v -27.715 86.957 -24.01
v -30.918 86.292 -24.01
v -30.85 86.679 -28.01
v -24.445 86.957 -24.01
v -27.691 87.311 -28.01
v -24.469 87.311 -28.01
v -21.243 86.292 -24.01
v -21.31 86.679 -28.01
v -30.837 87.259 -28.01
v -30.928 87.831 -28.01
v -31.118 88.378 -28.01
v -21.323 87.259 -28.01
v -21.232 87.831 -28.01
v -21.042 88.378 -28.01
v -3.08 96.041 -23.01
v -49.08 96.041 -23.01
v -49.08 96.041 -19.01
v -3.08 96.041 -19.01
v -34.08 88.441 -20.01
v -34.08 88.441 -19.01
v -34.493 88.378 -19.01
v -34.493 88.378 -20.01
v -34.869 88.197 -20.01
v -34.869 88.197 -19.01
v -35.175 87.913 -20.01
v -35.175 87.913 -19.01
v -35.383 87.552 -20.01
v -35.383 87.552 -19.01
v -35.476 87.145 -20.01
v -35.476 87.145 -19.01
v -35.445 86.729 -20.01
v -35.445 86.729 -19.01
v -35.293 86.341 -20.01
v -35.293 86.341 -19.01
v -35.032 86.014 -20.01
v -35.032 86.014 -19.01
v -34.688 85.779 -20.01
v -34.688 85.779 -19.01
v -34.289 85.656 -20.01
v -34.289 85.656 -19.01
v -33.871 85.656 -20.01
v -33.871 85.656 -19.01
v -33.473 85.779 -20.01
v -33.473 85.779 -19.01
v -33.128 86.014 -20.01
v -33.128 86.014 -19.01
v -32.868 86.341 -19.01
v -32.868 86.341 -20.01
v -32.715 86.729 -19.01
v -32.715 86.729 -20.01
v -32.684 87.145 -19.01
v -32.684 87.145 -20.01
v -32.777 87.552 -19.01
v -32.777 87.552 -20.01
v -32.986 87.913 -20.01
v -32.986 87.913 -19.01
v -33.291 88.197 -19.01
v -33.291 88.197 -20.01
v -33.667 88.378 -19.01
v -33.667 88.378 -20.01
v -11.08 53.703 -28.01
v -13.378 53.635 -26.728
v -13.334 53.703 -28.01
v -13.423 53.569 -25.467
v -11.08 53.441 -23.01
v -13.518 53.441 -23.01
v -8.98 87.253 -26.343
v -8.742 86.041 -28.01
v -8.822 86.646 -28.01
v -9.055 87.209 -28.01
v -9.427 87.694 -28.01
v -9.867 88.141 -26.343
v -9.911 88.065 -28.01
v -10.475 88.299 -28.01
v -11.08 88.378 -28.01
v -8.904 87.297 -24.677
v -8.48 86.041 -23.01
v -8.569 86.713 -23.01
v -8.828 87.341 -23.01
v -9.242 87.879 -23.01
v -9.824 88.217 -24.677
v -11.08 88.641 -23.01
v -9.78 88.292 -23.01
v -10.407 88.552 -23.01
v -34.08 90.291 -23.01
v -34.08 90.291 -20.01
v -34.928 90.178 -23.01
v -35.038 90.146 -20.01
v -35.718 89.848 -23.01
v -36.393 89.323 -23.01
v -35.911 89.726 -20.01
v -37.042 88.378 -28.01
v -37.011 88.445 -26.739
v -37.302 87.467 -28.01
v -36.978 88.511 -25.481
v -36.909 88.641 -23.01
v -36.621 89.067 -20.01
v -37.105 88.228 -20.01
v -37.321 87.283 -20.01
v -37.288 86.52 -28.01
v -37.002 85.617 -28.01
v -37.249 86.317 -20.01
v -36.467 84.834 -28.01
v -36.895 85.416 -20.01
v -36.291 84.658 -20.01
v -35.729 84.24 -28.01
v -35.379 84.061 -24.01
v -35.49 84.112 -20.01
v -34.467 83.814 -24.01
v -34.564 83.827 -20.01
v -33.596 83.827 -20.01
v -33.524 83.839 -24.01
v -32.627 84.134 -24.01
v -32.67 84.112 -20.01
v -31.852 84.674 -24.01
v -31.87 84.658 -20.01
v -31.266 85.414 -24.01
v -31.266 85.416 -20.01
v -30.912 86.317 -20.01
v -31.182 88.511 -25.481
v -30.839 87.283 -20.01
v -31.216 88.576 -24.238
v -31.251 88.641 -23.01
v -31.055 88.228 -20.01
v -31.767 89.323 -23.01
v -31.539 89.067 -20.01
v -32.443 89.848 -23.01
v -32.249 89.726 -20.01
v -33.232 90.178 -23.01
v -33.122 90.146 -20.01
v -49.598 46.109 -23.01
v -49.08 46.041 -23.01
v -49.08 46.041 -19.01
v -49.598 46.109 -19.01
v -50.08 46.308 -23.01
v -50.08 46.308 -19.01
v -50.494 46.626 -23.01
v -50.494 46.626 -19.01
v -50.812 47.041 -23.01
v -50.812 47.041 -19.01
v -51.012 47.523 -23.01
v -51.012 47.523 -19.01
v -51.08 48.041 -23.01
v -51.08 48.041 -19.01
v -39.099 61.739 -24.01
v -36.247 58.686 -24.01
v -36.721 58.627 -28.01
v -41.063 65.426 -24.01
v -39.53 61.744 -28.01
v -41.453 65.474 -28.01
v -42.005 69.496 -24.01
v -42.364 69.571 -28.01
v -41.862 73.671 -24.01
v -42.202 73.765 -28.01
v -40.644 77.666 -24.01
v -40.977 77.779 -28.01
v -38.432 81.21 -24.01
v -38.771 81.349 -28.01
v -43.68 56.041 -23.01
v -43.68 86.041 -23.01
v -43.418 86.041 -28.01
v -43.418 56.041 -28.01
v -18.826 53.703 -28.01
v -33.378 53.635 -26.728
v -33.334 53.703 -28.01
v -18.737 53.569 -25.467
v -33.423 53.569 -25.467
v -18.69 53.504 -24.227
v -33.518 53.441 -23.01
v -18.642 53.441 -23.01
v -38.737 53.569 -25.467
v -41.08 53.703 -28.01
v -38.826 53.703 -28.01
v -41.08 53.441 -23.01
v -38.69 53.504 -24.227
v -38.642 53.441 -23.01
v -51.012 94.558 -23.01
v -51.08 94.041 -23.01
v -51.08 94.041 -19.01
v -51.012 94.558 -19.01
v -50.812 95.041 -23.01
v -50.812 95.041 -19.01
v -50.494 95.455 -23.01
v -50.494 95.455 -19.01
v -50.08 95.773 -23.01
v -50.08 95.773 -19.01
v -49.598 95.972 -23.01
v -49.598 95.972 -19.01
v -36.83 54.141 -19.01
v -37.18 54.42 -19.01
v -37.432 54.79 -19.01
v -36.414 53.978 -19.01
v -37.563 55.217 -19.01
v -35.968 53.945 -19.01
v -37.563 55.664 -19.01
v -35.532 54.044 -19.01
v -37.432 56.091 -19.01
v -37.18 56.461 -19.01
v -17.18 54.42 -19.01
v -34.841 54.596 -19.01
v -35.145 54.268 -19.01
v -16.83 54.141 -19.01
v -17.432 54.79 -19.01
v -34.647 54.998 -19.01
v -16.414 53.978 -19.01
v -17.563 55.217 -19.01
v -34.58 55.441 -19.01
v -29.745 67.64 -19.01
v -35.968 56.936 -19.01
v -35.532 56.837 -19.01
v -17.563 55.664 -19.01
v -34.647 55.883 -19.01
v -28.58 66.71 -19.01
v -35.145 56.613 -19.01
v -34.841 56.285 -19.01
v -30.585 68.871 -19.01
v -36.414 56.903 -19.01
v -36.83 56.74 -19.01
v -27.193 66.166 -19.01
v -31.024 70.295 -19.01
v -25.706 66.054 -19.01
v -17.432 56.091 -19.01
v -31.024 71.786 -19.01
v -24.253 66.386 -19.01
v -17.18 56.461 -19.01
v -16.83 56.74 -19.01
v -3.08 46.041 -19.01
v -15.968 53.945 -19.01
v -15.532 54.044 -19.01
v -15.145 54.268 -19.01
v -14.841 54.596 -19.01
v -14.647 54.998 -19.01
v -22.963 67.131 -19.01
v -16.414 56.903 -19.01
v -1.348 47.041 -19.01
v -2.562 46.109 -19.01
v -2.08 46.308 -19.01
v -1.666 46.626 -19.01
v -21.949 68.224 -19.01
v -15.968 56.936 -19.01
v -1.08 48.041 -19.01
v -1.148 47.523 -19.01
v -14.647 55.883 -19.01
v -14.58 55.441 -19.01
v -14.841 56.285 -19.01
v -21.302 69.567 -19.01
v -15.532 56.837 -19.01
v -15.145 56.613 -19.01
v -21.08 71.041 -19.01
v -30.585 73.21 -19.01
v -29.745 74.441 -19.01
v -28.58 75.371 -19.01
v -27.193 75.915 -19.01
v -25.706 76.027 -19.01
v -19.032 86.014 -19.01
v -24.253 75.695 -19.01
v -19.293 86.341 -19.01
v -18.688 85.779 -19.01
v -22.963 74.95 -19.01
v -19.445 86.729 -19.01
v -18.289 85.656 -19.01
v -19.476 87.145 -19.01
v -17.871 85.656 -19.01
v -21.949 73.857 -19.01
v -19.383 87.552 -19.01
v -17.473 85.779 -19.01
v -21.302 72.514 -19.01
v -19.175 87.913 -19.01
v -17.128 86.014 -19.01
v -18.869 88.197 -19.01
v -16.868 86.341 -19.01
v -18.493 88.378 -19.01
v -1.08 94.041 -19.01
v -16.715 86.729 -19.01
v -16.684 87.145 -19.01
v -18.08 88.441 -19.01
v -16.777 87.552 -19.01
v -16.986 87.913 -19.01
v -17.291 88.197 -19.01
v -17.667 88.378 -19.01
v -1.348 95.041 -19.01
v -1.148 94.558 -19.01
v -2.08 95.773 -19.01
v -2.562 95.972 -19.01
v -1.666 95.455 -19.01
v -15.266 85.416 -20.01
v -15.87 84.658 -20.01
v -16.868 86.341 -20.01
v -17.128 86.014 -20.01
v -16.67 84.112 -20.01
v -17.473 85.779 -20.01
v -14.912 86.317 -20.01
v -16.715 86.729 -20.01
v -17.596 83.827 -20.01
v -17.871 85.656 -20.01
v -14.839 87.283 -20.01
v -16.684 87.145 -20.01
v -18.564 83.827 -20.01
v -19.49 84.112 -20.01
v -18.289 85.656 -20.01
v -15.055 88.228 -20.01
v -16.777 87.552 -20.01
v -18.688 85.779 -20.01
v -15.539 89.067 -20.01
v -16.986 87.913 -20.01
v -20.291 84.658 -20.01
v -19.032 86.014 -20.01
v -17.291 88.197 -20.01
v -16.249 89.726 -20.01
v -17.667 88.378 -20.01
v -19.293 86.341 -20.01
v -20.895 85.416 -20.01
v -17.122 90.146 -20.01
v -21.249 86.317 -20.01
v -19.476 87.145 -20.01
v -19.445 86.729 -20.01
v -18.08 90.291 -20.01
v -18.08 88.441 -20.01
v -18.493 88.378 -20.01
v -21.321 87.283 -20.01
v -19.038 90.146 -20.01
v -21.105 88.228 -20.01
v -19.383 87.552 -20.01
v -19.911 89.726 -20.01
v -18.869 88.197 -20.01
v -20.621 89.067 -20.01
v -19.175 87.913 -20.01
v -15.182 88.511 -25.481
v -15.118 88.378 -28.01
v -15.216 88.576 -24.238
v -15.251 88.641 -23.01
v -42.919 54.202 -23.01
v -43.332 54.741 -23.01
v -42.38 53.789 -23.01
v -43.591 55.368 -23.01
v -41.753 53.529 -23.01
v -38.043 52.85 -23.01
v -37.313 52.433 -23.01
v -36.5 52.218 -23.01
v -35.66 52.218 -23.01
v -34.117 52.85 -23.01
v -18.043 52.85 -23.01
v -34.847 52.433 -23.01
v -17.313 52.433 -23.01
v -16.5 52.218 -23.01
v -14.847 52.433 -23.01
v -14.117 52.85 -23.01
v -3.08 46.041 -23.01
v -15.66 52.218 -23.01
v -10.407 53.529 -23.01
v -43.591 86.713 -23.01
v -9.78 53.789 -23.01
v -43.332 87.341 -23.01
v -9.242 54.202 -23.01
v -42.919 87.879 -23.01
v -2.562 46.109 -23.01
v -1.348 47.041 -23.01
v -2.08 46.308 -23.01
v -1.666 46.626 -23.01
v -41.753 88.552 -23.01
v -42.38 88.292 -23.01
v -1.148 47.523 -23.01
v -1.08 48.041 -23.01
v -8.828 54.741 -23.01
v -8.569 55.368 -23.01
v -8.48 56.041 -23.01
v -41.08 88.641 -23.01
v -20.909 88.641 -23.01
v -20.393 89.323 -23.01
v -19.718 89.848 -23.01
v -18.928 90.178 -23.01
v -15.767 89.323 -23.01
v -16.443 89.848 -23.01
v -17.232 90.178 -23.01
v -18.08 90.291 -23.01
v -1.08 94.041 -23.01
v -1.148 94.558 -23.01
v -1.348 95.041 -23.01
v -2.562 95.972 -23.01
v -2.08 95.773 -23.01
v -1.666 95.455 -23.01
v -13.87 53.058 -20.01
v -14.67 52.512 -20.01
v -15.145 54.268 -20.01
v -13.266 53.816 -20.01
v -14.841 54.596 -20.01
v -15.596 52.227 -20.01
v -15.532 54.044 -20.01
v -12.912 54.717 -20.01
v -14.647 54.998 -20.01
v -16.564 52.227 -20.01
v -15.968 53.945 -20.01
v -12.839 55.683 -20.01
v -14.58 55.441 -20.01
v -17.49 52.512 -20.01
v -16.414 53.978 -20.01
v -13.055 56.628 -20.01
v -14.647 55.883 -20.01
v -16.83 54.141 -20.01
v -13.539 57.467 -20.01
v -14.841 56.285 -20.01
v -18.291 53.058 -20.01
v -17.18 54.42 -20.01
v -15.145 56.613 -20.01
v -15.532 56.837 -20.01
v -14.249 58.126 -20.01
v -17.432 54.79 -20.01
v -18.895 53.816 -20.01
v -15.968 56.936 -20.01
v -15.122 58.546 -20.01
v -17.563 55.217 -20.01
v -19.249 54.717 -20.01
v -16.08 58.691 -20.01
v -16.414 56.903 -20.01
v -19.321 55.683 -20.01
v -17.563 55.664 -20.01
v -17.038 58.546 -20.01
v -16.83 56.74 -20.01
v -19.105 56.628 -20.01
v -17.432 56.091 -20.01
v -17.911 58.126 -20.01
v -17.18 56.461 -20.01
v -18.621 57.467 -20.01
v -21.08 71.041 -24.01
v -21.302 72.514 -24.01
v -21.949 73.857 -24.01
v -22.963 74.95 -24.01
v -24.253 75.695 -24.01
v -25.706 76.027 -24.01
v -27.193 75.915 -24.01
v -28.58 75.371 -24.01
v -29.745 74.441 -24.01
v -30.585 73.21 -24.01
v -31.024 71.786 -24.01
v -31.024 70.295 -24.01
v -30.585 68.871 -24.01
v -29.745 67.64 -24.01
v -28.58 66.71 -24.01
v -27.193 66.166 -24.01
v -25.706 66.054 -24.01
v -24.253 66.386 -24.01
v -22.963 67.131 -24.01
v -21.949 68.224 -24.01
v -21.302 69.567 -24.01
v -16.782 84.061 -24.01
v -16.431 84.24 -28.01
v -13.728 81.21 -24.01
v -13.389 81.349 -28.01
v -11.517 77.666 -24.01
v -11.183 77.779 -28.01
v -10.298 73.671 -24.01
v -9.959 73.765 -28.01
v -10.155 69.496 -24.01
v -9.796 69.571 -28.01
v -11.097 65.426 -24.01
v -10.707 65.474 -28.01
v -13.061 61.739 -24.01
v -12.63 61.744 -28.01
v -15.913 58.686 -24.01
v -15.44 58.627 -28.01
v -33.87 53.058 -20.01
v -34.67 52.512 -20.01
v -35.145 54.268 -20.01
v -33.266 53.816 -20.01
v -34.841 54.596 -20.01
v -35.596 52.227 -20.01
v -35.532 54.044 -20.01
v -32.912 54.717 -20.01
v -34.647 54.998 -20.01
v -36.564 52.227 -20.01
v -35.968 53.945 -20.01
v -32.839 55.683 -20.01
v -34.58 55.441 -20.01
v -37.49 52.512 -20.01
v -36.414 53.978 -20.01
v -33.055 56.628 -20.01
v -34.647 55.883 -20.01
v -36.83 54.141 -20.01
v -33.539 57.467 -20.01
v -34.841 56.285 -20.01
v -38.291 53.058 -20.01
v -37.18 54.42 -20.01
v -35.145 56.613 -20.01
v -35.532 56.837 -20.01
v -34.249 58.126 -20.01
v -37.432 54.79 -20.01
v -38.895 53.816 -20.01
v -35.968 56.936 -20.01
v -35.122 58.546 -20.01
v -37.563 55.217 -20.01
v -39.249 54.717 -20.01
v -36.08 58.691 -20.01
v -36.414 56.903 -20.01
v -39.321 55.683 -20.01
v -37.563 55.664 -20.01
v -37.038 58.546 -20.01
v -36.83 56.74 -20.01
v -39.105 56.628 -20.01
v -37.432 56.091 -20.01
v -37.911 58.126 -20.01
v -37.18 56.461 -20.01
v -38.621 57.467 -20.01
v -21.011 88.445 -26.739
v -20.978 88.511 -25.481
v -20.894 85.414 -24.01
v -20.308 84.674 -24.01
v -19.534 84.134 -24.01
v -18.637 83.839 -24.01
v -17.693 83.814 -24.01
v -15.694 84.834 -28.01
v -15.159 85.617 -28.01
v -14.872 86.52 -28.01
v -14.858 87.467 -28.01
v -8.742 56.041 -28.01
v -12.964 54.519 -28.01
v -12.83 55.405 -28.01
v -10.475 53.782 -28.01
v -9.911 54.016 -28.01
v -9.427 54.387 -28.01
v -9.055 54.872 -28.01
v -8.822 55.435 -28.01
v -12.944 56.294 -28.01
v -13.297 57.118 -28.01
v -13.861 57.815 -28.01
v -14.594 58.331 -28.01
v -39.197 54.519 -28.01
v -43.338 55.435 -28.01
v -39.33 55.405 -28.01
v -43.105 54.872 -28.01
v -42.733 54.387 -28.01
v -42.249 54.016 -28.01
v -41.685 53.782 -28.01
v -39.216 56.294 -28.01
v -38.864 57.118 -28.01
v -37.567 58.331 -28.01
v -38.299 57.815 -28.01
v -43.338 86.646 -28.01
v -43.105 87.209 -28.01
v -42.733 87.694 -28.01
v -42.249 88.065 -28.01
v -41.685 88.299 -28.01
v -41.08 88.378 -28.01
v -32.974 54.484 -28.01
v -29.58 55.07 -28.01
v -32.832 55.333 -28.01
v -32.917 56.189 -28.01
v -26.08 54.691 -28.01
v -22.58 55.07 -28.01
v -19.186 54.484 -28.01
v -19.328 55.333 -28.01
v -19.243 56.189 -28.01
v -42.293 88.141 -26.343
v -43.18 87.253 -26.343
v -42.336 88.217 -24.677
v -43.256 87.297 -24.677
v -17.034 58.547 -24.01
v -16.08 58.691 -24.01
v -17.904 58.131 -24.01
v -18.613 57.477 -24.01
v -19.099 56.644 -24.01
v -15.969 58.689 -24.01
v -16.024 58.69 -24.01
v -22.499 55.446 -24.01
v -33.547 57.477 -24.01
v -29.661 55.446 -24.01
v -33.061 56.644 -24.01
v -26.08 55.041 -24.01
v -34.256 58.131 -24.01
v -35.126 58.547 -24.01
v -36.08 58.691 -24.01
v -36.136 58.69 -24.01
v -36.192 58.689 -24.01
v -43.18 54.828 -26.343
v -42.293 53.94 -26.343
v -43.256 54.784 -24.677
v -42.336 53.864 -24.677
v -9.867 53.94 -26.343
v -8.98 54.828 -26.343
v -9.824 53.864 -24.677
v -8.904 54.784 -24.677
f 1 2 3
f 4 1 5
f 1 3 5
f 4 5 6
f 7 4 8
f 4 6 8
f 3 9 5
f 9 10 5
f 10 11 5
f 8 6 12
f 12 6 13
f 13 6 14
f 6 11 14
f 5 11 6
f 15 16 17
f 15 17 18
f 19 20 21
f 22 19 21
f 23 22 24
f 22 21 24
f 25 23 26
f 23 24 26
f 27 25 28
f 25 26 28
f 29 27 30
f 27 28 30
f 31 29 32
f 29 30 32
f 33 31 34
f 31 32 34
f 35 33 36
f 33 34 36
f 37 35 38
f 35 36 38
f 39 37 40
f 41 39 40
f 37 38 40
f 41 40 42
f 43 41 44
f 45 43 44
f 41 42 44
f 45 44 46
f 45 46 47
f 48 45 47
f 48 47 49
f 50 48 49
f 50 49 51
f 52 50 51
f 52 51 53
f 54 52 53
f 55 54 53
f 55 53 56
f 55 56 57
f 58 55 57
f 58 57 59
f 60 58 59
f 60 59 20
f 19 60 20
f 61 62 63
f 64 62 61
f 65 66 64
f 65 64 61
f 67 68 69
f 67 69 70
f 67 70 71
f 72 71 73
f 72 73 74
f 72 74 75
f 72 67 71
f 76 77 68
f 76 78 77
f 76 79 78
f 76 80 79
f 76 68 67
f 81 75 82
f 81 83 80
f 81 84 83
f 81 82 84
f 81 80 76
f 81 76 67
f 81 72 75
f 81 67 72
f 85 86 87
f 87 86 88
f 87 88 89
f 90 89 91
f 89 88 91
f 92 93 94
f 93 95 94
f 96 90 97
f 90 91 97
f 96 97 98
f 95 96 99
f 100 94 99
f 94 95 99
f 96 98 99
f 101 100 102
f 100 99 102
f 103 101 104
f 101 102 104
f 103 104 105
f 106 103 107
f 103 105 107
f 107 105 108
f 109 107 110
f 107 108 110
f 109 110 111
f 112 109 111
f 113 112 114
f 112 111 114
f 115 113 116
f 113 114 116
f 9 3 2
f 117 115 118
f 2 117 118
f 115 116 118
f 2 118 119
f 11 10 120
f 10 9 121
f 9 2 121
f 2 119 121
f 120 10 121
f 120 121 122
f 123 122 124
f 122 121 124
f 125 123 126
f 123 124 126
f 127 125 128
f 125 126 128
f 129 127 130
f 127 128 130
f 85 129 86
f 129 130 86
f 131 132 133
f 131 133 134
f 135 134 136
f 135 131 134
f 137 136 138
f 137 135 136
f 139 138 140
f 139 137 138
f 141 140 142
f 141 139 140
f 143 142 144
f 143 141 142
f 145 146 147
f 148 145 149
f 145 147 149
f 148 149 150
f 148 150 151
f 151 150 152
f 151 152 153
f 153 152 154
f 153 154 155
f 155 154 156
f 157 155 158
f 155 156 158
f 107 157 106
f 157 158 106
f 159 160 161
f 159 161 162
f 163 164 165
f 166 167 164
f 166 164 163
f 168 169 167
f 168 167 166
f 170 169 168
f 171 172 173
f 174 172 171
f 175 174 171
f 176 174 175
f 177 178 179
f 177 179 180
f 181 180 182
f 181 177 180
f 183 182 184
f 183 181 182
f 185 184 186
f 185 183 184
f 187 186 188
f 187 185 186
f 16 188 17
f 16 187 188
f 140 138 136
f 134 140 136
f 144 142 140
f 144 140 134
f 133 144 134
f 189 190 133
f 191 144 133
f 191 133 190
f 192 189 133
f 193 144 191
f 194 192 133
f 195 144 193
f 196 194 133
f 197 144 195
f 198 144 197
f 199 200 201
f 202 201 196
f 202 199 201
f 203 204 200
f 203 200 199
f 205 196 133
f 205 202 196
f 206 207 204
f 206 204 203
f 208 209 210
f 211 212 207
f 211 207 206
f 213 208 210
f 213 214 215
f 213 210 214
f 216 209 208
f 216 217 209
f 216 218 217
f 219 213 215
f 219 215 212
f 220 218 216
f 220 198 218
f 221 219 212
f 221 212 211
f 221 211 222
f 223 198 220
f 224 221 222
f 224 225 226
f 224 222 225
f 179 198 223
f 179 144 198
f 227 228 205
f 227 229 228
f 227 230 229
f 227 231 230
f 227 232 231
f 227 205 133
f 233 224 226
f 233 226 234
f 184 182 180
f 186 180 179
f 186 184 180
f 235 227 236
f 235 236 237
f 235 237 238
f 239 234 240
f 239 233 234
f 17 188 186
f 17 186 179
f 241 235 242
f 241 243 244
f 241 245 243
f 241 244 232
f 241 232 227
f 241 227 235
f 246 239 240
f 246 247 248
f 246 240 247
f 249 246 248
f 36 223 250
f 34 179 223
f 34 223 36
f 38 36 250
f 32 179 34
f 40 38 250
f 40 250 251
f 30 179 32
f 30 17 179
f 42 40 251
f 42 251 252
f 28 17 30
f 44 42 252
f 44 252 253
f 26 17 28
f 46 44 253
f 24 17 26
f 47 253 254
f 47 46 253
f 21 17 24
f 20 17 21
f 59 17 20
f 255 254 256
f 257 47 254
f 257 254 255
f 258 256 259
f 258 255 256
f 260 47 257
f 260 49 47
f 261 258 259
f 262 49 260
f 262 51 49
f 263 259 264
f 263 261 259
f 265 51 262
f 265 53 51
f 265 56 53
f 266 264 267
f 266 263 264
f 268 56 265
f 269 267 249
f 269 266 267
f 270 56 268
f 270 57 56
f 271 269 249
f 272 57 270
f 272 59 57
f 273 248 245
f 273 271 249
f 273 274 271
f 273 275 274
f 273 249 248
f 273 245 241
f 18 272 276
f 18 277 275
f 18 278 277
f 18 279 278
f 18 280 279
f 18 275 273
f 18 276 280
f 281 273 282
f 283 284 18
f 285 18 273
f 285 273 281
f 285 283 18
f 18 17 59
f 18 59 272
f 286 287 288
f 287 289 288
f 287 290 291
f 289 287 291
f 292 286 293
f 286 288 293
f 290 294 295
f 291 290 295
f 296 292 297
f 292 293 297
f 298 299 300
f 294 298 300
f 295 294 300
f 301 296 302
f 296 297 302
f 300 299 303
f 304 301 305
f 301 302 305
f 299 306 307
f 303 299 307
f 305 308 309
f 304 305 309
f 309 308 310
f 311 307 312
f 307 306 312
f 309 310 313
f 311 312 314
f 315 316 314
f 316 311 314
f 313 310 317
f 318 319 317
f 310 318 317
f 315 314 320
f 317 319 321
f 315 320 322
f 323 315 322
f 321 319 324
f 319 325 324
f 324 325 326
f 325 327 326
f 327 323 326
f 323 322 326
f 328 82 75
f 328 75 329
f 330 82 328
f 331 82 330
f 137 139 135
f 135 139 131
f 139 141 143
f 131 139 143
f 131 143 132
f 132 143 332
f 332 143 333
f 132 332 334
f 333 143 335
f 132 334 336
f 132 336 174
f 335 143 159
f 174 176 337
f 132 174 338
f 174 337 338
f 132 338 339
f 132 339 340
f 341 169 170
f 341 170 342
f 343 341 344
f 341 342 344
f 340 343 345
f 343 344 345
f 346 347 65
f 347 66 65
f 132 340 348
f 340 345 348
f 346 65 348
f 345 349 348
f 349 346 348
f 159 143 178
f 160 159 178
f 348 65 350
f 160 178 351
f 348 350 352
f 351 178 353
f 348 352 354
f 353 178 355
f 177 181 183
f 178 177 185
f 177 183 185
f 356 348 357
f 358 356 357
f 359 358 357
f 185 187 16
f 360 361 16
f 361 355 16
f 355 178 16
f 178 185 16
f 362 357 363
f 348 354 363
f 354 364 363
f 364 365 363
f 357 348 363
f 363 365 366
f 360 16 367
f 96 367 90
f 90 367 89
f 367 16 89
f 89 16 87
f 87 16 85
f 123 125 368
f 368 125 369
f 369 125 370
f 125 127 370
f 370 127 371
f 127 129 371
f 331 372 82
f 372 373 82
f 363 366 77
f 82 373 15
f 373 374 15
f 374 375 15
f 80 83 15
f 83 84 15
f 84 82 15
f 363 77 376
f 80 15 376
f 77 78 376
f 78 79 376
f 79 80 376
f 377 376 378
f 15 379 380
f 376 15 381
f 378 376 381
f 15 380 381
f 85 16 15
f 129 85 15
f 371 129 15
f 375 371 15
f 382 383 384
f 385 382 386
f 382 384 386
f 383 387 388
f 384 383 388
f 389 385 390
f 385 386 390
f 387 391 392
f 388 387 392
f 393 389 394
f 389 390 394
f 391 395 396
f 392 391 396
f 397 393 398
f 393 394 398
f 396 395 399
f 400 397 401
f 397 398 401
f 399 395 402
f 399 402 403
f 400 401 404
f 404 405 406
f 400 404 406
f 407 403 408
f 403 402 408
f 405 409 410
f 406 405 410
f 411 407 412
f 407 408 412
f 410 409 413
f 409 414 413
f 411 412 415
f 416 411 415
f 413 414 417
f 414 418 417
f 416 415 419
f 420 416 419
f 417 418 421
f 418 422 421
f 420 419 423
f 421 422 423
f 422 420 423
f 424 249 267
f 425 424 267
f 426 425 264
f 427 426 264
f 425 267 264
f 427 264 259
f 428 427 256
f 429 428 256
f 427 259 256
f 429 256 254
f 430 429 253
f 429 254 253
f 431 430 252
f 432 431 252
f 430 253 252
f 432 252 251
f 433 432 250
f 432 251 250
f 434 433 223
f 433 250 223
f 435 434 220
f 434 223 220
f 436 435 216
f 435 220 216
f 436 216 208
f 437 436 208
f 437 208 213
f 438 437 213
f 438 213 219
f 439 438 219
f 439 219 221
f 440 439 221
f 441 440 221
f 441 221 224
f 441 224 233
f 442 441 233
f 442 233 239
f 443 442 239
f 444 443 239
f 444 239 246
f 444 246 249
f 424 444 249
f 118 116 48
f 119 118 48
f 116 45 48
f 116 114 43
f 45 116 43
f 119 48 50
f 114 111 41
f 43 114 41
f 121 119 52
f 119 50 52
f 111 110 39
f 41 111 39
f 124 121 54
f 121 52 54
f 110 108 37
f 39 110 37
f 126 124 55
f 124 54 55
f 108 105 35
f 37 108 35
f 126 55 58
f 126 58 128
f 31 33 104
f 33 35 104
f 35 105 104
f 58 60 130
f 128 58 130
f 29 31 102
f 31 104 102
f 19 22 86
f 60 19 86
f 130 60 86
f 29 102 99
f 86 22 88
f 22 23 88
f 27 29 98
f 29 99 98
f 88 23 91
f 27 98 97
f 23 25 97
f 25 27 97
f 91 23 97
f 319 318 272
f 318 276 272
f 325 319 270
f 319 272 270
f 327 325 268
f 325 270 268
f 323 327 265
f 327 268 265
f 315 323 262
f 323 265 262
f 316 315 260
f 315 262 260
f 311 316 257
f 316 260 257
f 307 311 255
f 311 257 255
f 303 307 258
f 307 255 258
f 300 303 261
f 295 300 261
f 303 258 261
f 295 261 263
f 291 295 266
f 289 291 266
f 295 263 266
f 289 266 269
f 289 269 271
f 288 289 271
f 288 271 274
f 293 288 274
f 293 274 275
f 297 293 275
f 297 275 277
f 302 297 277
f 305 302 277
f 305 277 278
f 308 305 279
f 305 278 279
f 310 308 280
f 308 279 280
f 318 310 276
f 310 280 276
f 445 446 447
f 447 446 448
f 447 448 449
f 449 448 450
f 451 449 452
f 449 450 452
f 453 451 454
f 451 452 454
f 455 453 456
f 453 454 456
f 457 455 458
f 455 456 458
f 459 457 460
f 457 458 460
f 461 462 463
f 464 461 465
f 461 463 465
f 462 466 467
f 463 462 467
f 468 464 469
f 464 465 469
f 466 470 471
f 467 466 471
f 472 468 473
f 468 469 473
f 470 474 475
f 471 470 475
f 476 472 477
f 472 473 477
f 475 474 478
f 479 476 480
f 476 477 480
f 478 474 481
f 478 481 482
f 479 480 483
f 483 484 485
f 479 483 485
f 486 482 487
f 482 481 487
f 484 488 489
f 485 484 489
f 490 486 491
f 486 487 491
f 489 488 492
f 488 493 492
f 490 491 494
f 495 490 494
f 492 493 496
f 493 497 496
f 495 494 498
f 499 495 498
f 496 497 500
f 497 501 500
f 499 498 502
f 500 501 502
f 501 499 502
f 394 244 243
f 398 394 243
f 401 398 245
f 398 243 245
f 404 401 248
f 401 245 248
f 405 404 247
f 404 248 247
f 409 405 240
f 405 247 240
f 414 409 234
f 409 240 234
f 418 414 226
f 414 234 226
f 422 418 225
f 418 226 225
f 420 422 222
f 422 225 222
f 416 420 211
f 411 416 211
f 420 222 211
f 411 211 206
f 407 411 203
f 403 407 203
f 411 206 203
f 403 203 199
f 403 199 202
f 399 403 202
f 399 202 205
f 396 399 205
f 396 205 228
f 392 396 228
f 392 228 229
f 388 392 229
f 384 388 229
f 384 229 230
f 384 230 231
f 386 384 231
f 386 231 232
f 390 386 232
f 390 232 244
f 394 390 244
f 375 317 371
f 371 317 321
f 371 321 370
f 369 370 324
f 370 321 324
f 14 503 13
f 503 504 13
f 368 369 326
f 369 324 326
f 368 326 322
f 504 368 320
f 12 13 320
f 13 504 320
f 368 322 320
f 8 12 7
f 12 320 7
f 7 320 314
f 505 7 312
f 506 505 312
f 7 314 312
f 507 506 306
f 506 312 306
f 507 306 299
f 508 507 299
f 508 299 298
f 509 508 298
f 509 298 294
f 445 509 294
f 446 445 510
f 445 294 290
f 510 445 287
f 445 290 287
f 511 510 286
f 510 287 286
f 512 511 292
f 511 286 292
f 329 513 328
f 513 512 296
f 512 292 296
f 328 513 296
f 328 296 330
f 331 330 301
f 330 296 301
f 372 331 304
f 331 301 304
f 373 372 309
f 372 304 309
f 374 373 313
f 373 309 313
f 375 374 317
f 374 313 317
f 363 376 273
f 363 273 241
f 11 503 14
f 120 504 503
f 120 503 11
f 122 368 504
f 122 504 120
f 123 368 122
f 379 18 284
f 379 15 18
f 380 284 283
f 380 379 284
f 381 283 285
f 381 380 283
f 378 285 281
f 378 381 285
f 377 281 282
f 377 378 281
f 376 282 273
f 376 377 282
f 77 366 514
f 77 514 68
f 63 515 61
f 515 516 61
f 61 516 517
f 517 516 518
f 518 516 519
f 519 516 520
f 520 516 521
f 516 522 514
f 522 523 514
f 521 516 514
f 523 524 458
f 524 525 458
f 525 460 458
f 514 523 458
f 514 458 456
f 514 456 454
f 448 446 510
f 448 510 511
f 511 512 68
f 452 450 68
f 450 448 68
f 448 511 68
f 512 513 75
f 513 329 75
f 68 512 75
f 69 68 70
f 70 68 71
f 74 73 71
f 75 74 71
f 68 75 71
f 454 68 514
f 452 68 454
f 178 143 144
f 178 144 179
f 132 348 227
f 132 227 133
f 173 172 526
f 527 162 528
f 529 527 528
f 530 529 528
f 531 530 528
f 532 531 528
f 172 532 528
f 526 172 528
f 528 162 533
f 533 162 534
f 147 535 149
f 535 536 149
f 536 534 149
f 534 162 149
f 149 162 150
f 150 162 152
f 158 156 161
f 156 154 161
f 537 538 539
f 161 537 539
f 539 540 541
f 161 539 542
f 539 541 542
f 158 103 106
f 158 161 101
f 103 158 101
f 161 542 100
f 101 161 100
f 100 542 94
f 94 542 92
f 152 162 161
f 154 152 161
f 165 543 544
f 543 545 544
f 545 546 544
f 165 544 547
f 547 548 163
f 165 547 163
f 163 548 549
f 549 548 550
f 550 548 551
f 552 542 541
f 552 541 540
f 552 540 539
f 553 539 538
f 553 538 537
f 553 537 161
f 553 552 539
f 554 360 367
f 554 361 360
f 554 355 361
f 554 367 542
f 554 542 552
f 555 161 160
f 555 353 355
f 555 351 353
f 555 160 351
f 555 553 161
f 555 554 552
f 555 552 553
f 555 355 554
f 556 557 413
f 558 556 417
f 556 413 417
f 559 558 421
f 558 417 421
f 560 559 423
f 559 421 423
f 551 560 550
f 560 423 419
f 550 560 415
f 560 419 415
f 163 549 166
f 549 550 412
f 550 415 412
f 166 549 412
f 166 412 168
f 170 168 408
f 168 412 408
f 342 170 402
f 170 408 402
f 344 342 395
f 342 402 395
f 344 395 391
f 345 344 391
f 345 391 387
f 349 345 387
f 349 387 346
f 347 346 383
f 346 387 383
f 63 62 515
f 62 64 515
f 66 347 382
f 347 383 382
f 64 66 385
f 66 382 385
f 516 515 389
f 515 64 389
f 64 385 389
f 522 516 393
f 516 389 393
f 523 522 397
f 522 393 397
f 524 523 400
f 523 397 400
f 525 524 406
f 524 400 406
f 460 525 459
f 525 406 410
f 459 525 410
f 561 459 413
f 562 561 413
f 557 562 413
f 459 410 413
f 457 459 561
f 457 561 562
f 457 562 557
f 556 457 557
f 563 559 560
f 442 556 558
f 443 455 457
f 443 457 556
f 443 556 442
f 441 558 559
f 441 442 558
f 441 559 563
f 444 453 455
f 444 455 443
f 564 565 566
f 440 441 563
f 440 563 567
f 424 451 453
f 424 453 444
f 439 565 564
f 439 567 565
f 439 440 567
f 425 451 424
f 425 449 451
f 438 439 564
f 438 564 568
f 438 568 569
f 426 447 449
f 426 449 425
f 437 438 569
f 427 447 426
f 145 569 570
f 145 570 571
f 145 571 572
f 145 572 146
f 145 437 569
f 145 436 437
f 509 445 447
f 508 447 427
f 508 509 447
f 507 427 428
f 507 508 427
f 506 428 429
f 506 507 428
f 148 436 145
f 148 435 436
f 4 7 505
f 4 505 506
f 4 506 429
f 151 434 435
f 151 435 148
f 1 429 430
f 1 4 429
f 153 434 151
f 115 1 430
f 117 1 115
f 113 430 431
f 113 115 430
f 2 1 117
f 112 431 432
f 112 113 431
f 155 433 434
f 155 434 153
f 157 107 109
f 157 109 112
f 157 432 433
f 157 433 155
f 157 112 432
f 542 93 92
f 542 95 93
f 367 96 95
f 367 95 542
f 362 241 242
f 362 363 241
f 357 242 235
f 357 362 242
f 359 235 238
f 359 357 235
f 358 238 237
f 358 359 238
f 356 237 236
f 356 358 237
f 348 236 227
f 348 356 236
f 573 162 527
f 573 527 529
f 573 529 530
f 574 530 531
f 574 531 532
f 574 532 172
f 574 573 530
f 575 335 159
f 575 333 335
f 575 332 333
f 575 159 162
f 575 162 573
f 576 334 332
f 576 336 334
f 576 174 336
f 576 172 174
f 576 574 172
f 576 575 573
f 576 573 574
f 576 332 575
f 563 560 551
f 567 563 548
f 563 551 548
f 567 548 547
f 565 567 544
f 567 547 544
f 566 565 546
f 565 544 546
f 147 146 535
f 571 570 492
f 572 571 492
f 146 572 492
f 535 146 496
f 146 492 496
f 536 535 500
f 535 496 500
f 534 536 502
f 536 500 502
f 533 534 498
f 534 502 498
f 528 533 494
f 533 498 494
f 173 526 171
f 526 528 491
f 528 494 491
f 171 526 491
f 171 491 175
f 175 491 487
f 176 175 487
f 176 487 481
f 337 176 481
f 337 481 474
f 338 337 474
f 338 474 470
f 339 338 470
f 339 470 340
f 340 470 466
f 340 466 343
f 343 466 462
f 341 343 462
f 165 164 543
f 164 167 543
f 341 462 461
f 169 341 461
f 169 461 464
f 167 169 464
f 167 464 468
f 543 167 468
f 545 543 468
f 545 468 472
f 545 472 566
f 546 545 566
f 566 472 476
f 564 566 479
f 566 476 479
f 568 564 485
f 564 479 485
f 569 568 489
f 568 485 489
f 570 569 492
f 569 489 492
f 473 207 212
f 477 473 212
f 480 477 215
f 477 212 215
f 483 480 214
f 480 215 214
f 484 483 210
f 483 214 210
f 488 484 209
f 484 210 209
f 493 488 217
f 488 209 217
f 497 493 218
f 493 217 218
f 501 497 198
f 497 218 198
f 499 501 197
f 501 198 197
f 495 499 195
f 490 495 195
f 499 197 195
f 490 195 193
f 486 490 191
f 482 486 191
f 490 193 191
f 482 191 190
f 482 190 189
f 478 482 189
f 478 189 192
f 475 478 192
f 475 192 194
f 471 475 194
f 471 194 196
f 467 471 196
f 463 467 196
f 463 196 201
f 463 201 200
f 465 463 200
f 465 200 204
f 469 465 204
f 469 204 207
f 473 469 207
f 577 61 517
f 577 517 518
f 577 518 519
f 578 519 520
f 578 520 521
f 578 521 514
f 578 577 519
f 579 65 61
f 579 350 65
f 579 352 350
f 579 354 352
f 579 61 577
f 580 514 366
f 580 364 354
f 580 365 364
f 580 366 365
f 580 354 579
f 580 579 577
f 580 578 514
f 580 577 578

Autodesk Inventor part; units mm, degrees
ref_plane "YZ Plane" through (0, 0, 0) normal (1, 0, 0) x (0, 1, 0)
ref_plane "XZ Plane" through (0, 0, 0) normal (0, 1, 0) x (-1, 0, 0)
ref_plane "XY Plane" through (0, 0, 0) normal (0, 0, 1) x (1, 0, 0)
ref_plane "Arbeitsebene15" through (-38.58009, 58.540516, -23.010083) normal (0, 0, 1) x (1, 0, 0)
sketch "Skizze38" plane through (-38.58009, 58.540516, -23.010083) normal (0, 0, 1) x (1, 0, 0)
  circle A0 centre (27, 33.3) radius 3
  circle A1 centre (-8.3, 27) radius 3
  circle A2 centre (-2, -8.3) radius 3
  circle A3 centre (33.3, -2) radius 3
  circle A4 centre (27, -8.3) radius 3
  circle A5 centre (-8.3, -2) radius 3
  circle A6 centre (-2, 33.3) radius 3
  circle A7 centre (33.3, 27) radius 3
  line L0 (27.5, 29.5) -> (-2.5, 29.5)
  arc A8 (29.5, 27.5) -> (27.5, 29.5) centre (27.5, 27.5) ccw
  line L1 (29.5, 27.5) -> (29.5, -2.5)
  arc A9 (27.5, -4.5) -> (29.5, -2.5) centre (27.5, -2.5) ccw
  line L2 (-2.5, -4.5) -> (27.5, -4.5)
  arc A10 (-4.5, -2.5) -> (-2.5, -4.5) centre (-2.5, -2.5) ccw
  line L3 (-4.5, -2.5) -> (-4.5, 27.5)
  arc A11 (-2.5, 29.5) -> (-4.5, 27.5) centre (-2.5, 27.5) ccw
  circle A12 centre (33.5, 33.5) radius 2.5
  circle A13 centre (-8.5, -8.5) radius 2.5
  circle A14 centre (33.5, -8.5) radius 2.5
  circle A15 centre (-8.5, 33.5) radius 2.5
  line L4 (-11.75, -10.5) -> (-11.75, 8.25)
  arc A16 (-11.75, -10.5) -> (-10.5, -11.75) centre (-10.5, -10.5) ccw
  line L5 (8.25, -11.75) -> (-10.5, -11.75)
  line L6 (8.25, -13.877389) -> (8.25, -11.75)
  arc A17 (7.405556, -14.865216) -> (8.25, -13.877389) centre (7.25, -13.877389) ccw
  arc A18 (7.405556, -14.865216) -> (7.6, -17.35) centre (7.6, -16.1) ccw
  line L7 (17.4, -17.35) -> (7.6, -17.35)
  arc A19 (17.4, -17.35) -> (17.594444, -14.865216) centre (17.4, -16.1) ccw
  arc A20 (16.75, -13.877389) -> (17.594444, -14.865216) centre (17.75, -13.877389) ccw
  line L8 (16.75, -11.75) -> (16.75, -13.877389)
  line L9 (35.5, -11.75) -> (16.75, -11.75)
  arc A21 (35.5, -11.75) -> (36.75, -10.5) centre (35.5, -10.5) ccw
  line L10 (36.75, 6.487451) -> (36.75, -10.5)
  arc A22 (36.75, 6.487451) -> (36.55605, 6.521706) centre (36.65, 6.487451) ccw
  arc A23 (31.3, 7.45) -> (36.55605, 6.521706) centre (34.01, 7.45) ccw
  line L11 (31.3, 17.55) -> (31.3, 7.45)
  arc A24 (36.55605, 18.478294) -> (31.3, 17.55) centre (34.01, 17.55) ccw
  arc A25 (36.55605, 18.478294) -> (36.75, 18.512549) centre (36.65, 18.512549) ccw
  line L12 (36.75, 35.5) -> (36.75, 18.512549)
  arc A26 (36.75, 35.5) -> (35.5, 36.75) centre (35.5, 35.5) ccw
  line L13 (18.512549, 36.75) -> (35.5, 36.75)
  arc A27 (18.512549, 36.75) -> (18.478294, 36.55605) centre (18.512549, 36.65) ccw
  arc A28 (17.55, 31.3) -> (18.478294, 36.55605) centre (17.55, 34.01) ccw
  line L14 (7.45, 31.3) -> (17.55, 31.3)
  arc A29 (6.521706, 36.55605) -> (7.45, 31.3) centre (7.45, 34.01) ccw
  arc A30 (6.521706, 36.55605) -> (6.487451, 36.75) centre (6.487451, 36.65) ccw
  line L15 (-10.5, 36.75) -> (6.487451, 36.75)
  arc A31 (-10.5, 36.75) -> (-11.75, 35.5) centre (-10.5, 35.5) ccw
  line L16 (-11.75, 16.75) -> (-11.75, 35.5)
  line L17 (-13.877389, 16.75) -> (-11.75, 16.75)
  arc A32 (-14.865216, 17.594444) -> (-13.877389, 16.75) centre (-13.877389, 17.75) ccw
  arc A33 (-14.865216, 17.594444) -> (-17.35, 17.4) centre (-16.1, 17.4) ccw
  line L18 (-17.35, 7.6) -> (-17.35, 17.4)
  arc A34 (-17.35, 7.6) -> (-14.865216, 7.405556) centre (-16.1, 7.6) ccw
  arc A35 (-13.877389, 8.25) -> (-14.865216, 7.405556) centre (-13.877389, 7.25) ccw
  line L19 (-11.75, 8.25) -> (-13.877389, 8.25)
  line L20 (-2.5, 30.1) -> (27.5, 30.1)
  arc A36 (30.1, 27.5) -> (27.5, 30.1) centre (27.5, 27.5) ccw
  line L21 (30.1, 27.5) -> (30.1, -2.5)
  arc A37 (27.5, -5.1) -> (30.1, -2.5) centre (27.5, -2.5) ccw
  line L22 (27.5, -5.1) -> (-2.5, -5.1)
  arc A38 (-5.1, -2.5) -> (-2.5, -5.1) centre (-2.5, -2.5) ccw
  line L23 (-5.1, -2.5) -> (-5.1, 27.5)
  arc A39 (-2.5, 30.1) -> (-5.1, 27.5) centre (-2.5, 27.5) ccw
  point P0 (38.58009, -58.540516)
  dimension "d425" = 0.6
sketch "Skizze38 outline for Extrusion20" plane through (-38.58009, 58.540516, -23.010083) normal (0, 0, 1) x (1, 0, 0)
  arc A0 (-5.1, -2.5) -> (-2.5, -5.1) centre (-2.5, -2.5) ccw
  line L0 (-5.1, 27.5) -> (-5.1, -2.5)
  arc A1 (-2.5, 30.1) -> (-5.1, 27.5) centre (-2.5, 27.5) ccw
  line L1 (27.5, 30.1) -> (-2.5, 30.1)
  arc A2 (30.1, 27.5) -> (27.5, 30.1) centre (27.5, 27.5) ccw
  line L2 (30.1, -2.5) -> (30.1, 27.5)
  arc A3 (27.5, -5.1) -> (30.1, -2.5) centre (27.5, -2.5) ccw
  line L3 (-2.5, -5.1) -> (27.5, -5.1)
extrude "Extrusion20" add sketch "Skizze38 outline for Extrusion20" against normal blind 5 draft -3
sketch "Skizze39" plane through (-38.58009, 58.540516, -23.010083) normal (0, 0, 1) x (1, 0, 0)
  line L0 (-2.5, -5.1) -> (27.5, -5.1) projected
  arc A0 (27.5, -5.1) -> (30.1, -2.5) centre (27.5, -2.5) ccw projected
  line L1 (30.1, -2.5) -> (30.1, 27.5) projected
  arc A1 (30.1, 27.5) -> (27.5, 30.1) centre (27.5, 27.5) ccw projected
  line L2 (27.5, 30.1) -> (-2.5, 30.1) projected
  arc A2 (-2.5, 30.1) -> (-5.1, 27.5) centre (-2.5, 27.5) ccw projected
  line L3 (-5.1, 27.5) -> (-5.1, -2.5) projected
  arc A3 (-5.1, -2.5) -> (-2.5, -5.1) centre (-2.5, -2.5) ccw projected
  line L4 (17.5, -12.5) -> (35.5, -12.5) projected
  line L5 (-10.5, 37.5) -> (35.5, 37.5)
  line L6 (37.5, 35.5) -> (37.5, -10.5)
  line L7 (35.5, -12.5) -> (-10.5, -12.5)
  line L8 (-12.5, -10.5) -> (-12.5, 35.5)
  line L9 (-12.5, 37.5) -> (37.5, -12.5) construction
  line L10 (37.5, 37.5) -> (-12.5, -12.5) construction
  arc A4 (37.5, 35.5) -> (35.5, 37.5) centre (35.5, 35.5) ccw projected
  arc A5 (37.5, 35.5) -> (35.5, 37.5) centre (35.5, 35.5) ccw
  arc A6 (-10.5, 37.5) -> (-12.5, 35.5) centre (-10.5, 35.5) ccw
  arc A7 (-12.5, -10.5) -> (-10.5, -12.5) centre (-10.5, -10.5) ccw
  arc A8 (35.5, -12.5) -> (37.5, -10.5) centre (35.5, -10.5) ccw
  point P0 (38.58009, -58.540516)
  point P1 (12.5, 12.5)
  point P2 (35.5, -12.5)
  dimension "d428" = 50
  dimension "d429" = 50
  dimension "d430" = 2
extrude "Extrusion21" add sketch "Skizze39" along normal blind 4 contours A3 L3 A2 L2 A1 L1 A0 L0 | L7 A7 L8 A6 L5 A4 L6 A8 L4
sketch "Skizze40" plane through (-38.58009, 58.540516, -19.010083) normal (0, 0, 1) x (1, 0, 0)
  arc A0 (-10.5, 37.5) -> (-12.5, 35.5) centre (-10.5, 35.5) ccw projected
  line L0 (-12.5, 35.5) -> (-12.5, -10.5) projected
  arc A1 (-12.5, -10.5) -> (-10.5, -12.5) centre (-10.5, -10.5) ccw projected
  line L1 (-10.5, -12.5) -> (35.5, -12.5) projected
  arc A2 (35.5, -12.5) -> (37.5, -10.5) centre (35.5, -10.5) ccw projected
  line L2 (37.5, -10.5) -> (37.5, 35.5) projected
  arc A3 (37.5, 35.5) -> (35.5, 37.5) centre (35.5, 35.5) ccw projected
  line L3 (35.5, 37.5) -> (-10.5, 37.5) projected
  circle A4 centre (12.5, 12.5) radius 5
  line L4 (-2.5, 20) -> (27.5, 20) construction
  line L5 (27.5, 20) -> (27.5, -8) construction
  line L6 (27.5, -8) -> (-2.5, -8) construction
  line L7 (-2.5, -8) -> (-2.5, 20) construction
  circle A5 centre (2.5, -3.1) radius 1.5
  circle A6 centre (22.5, -3.1) radius 1.5
  point P0 (38.58009, -58.540516)
  dimension "d433" = 10
  dimension "d434" = 30
  dimension "d435" = 28
  dimension "d436" = 15
  dimension "d437" = 25
  dimension "d438" = 25
  dimension "d439" = 7.5
  dimension "d440" = 3
  dimension "d441" = 3
  dimension "d442" = 5
  dimension "d443" = 5
  dimension "d466" = 15.6
  dimension "d467" = 15.6
extrude "Extrusion22" cut sketch "Skizze40" against normal through all contours A4 | A5 | A6
sketch "Skizze41" plane through (-38.58009, 58.540516, -28.010083) normal (0, 0, -1) x (-1, 0, 0)
  circle A0 centre (-12.5, 12.5) radius 5 projected
  circle A1 centre (-4.5, 28.5) radius 1.4
  circle A2 centre (-20.5, 28.5) radius 1.4
  circle A3 centre (-2.5, -3.1) radius 1.5 projected
  circle A4 centre (-22.5, -3.1) radius 1.5 projected
  point P0 (-38.58009, -58.540516)
  point P1 (-3.17813, -4.837961)
  point P2 (-1.82187, -4.837961)
  point P3 (-23.17813, -4.837961)
  point P4 (-21.82187, -4.837961)
  dimension "d456" = 2.8
  dimension "d457" = 2.8
  dimension "d458" = 16
  dimension "d459" = 16
  dimension "d460" = 8
  dimension "d461" = 8
hole "Bohrung10" at (-34.08009, 87.040516, -28.010083) at (-18.08009, 87.040516, -28.010083) at (-36.08009, 55.440516, -28.010083) at (-16.08009, 55.440516, -28.010083) direction (0, 0, 1) diameter 2.8 end through all counterbore diameter 6.5 counterbore depth 8
ref_plane "Arbeitsebene16" through (-38.58009, 58.540516, -24.010083) normal (0, 0, -1) x (-1, 0, 0)
sketch "Skizze44" plane through (-38.58009, 58.540516, -24.010083) normal (0, 0, -1) x (-1, 0, 0)
  circle A0 centre (-12.5, 12.5) radius 5 projected
  circle A1 centre (-12.5, 12.5) radius 16
  point P0 (-38.58009, -58.540516)
  dimension "d472" = 32
extrude "Extrusion25" cut sketch "Skizze44" along normal through all draft 5 contours A0 | A1
equation "\"d_i\" = 40"
equation "\"d_o\" = 40"
equation "\"d_part\" = 50"
equation "\"d6\" = 0"
equation "\"d7\" = 0"
equation "\"d8\" = 0"
equation "\"d9\" = 0"
equation "\"d13\" = 0"
equation "\"d14\" = 0"
equation "\"d20\" = 0"
equation "\"d21\" = 0"
equation "\"d22\" = 0"
equation "\"d23\" = 0"
equation "\"d24\" = 0"
equation "\"d25\" = 3"
equation "\"d26\" = 0"
equation "\"d27\" = 0"
equation "\"d28\" = 0"
equation "\"d29\" = 0"
equation "\"d30\" = 0"
equation "\"d31\" = 0"
equation "\"d32\" = 0"
equation "\"d33\" = 0"
equation "\"d34\" = 0"
equation "\"d46\" = 0"
equation "\"d47\" = 0"
equation "\"d48\" = 0"
equation "\"d50\" = 0"
equation "\"d51\" = 0"
equation "\"d52\" = 0"
equation "\"d53\" = 0"
equation "\"d54\" = 0"
equation "\"d55\" = 0"
equation "\"d56\" = 0"
equation "\"d57\" = 0"
equation "\"d58\" = 0"
equation "\"d59\" = 0"
equation "\"magnet_offset\" = 0"
equation "\"screw_offset\" = 0"
equation "\"mal_puzzle_offset\" = 0"
equation "\"fem_puzzle_offset\" = 0"
properties part number "20_Cube_Adapter_Zstage_manual"
